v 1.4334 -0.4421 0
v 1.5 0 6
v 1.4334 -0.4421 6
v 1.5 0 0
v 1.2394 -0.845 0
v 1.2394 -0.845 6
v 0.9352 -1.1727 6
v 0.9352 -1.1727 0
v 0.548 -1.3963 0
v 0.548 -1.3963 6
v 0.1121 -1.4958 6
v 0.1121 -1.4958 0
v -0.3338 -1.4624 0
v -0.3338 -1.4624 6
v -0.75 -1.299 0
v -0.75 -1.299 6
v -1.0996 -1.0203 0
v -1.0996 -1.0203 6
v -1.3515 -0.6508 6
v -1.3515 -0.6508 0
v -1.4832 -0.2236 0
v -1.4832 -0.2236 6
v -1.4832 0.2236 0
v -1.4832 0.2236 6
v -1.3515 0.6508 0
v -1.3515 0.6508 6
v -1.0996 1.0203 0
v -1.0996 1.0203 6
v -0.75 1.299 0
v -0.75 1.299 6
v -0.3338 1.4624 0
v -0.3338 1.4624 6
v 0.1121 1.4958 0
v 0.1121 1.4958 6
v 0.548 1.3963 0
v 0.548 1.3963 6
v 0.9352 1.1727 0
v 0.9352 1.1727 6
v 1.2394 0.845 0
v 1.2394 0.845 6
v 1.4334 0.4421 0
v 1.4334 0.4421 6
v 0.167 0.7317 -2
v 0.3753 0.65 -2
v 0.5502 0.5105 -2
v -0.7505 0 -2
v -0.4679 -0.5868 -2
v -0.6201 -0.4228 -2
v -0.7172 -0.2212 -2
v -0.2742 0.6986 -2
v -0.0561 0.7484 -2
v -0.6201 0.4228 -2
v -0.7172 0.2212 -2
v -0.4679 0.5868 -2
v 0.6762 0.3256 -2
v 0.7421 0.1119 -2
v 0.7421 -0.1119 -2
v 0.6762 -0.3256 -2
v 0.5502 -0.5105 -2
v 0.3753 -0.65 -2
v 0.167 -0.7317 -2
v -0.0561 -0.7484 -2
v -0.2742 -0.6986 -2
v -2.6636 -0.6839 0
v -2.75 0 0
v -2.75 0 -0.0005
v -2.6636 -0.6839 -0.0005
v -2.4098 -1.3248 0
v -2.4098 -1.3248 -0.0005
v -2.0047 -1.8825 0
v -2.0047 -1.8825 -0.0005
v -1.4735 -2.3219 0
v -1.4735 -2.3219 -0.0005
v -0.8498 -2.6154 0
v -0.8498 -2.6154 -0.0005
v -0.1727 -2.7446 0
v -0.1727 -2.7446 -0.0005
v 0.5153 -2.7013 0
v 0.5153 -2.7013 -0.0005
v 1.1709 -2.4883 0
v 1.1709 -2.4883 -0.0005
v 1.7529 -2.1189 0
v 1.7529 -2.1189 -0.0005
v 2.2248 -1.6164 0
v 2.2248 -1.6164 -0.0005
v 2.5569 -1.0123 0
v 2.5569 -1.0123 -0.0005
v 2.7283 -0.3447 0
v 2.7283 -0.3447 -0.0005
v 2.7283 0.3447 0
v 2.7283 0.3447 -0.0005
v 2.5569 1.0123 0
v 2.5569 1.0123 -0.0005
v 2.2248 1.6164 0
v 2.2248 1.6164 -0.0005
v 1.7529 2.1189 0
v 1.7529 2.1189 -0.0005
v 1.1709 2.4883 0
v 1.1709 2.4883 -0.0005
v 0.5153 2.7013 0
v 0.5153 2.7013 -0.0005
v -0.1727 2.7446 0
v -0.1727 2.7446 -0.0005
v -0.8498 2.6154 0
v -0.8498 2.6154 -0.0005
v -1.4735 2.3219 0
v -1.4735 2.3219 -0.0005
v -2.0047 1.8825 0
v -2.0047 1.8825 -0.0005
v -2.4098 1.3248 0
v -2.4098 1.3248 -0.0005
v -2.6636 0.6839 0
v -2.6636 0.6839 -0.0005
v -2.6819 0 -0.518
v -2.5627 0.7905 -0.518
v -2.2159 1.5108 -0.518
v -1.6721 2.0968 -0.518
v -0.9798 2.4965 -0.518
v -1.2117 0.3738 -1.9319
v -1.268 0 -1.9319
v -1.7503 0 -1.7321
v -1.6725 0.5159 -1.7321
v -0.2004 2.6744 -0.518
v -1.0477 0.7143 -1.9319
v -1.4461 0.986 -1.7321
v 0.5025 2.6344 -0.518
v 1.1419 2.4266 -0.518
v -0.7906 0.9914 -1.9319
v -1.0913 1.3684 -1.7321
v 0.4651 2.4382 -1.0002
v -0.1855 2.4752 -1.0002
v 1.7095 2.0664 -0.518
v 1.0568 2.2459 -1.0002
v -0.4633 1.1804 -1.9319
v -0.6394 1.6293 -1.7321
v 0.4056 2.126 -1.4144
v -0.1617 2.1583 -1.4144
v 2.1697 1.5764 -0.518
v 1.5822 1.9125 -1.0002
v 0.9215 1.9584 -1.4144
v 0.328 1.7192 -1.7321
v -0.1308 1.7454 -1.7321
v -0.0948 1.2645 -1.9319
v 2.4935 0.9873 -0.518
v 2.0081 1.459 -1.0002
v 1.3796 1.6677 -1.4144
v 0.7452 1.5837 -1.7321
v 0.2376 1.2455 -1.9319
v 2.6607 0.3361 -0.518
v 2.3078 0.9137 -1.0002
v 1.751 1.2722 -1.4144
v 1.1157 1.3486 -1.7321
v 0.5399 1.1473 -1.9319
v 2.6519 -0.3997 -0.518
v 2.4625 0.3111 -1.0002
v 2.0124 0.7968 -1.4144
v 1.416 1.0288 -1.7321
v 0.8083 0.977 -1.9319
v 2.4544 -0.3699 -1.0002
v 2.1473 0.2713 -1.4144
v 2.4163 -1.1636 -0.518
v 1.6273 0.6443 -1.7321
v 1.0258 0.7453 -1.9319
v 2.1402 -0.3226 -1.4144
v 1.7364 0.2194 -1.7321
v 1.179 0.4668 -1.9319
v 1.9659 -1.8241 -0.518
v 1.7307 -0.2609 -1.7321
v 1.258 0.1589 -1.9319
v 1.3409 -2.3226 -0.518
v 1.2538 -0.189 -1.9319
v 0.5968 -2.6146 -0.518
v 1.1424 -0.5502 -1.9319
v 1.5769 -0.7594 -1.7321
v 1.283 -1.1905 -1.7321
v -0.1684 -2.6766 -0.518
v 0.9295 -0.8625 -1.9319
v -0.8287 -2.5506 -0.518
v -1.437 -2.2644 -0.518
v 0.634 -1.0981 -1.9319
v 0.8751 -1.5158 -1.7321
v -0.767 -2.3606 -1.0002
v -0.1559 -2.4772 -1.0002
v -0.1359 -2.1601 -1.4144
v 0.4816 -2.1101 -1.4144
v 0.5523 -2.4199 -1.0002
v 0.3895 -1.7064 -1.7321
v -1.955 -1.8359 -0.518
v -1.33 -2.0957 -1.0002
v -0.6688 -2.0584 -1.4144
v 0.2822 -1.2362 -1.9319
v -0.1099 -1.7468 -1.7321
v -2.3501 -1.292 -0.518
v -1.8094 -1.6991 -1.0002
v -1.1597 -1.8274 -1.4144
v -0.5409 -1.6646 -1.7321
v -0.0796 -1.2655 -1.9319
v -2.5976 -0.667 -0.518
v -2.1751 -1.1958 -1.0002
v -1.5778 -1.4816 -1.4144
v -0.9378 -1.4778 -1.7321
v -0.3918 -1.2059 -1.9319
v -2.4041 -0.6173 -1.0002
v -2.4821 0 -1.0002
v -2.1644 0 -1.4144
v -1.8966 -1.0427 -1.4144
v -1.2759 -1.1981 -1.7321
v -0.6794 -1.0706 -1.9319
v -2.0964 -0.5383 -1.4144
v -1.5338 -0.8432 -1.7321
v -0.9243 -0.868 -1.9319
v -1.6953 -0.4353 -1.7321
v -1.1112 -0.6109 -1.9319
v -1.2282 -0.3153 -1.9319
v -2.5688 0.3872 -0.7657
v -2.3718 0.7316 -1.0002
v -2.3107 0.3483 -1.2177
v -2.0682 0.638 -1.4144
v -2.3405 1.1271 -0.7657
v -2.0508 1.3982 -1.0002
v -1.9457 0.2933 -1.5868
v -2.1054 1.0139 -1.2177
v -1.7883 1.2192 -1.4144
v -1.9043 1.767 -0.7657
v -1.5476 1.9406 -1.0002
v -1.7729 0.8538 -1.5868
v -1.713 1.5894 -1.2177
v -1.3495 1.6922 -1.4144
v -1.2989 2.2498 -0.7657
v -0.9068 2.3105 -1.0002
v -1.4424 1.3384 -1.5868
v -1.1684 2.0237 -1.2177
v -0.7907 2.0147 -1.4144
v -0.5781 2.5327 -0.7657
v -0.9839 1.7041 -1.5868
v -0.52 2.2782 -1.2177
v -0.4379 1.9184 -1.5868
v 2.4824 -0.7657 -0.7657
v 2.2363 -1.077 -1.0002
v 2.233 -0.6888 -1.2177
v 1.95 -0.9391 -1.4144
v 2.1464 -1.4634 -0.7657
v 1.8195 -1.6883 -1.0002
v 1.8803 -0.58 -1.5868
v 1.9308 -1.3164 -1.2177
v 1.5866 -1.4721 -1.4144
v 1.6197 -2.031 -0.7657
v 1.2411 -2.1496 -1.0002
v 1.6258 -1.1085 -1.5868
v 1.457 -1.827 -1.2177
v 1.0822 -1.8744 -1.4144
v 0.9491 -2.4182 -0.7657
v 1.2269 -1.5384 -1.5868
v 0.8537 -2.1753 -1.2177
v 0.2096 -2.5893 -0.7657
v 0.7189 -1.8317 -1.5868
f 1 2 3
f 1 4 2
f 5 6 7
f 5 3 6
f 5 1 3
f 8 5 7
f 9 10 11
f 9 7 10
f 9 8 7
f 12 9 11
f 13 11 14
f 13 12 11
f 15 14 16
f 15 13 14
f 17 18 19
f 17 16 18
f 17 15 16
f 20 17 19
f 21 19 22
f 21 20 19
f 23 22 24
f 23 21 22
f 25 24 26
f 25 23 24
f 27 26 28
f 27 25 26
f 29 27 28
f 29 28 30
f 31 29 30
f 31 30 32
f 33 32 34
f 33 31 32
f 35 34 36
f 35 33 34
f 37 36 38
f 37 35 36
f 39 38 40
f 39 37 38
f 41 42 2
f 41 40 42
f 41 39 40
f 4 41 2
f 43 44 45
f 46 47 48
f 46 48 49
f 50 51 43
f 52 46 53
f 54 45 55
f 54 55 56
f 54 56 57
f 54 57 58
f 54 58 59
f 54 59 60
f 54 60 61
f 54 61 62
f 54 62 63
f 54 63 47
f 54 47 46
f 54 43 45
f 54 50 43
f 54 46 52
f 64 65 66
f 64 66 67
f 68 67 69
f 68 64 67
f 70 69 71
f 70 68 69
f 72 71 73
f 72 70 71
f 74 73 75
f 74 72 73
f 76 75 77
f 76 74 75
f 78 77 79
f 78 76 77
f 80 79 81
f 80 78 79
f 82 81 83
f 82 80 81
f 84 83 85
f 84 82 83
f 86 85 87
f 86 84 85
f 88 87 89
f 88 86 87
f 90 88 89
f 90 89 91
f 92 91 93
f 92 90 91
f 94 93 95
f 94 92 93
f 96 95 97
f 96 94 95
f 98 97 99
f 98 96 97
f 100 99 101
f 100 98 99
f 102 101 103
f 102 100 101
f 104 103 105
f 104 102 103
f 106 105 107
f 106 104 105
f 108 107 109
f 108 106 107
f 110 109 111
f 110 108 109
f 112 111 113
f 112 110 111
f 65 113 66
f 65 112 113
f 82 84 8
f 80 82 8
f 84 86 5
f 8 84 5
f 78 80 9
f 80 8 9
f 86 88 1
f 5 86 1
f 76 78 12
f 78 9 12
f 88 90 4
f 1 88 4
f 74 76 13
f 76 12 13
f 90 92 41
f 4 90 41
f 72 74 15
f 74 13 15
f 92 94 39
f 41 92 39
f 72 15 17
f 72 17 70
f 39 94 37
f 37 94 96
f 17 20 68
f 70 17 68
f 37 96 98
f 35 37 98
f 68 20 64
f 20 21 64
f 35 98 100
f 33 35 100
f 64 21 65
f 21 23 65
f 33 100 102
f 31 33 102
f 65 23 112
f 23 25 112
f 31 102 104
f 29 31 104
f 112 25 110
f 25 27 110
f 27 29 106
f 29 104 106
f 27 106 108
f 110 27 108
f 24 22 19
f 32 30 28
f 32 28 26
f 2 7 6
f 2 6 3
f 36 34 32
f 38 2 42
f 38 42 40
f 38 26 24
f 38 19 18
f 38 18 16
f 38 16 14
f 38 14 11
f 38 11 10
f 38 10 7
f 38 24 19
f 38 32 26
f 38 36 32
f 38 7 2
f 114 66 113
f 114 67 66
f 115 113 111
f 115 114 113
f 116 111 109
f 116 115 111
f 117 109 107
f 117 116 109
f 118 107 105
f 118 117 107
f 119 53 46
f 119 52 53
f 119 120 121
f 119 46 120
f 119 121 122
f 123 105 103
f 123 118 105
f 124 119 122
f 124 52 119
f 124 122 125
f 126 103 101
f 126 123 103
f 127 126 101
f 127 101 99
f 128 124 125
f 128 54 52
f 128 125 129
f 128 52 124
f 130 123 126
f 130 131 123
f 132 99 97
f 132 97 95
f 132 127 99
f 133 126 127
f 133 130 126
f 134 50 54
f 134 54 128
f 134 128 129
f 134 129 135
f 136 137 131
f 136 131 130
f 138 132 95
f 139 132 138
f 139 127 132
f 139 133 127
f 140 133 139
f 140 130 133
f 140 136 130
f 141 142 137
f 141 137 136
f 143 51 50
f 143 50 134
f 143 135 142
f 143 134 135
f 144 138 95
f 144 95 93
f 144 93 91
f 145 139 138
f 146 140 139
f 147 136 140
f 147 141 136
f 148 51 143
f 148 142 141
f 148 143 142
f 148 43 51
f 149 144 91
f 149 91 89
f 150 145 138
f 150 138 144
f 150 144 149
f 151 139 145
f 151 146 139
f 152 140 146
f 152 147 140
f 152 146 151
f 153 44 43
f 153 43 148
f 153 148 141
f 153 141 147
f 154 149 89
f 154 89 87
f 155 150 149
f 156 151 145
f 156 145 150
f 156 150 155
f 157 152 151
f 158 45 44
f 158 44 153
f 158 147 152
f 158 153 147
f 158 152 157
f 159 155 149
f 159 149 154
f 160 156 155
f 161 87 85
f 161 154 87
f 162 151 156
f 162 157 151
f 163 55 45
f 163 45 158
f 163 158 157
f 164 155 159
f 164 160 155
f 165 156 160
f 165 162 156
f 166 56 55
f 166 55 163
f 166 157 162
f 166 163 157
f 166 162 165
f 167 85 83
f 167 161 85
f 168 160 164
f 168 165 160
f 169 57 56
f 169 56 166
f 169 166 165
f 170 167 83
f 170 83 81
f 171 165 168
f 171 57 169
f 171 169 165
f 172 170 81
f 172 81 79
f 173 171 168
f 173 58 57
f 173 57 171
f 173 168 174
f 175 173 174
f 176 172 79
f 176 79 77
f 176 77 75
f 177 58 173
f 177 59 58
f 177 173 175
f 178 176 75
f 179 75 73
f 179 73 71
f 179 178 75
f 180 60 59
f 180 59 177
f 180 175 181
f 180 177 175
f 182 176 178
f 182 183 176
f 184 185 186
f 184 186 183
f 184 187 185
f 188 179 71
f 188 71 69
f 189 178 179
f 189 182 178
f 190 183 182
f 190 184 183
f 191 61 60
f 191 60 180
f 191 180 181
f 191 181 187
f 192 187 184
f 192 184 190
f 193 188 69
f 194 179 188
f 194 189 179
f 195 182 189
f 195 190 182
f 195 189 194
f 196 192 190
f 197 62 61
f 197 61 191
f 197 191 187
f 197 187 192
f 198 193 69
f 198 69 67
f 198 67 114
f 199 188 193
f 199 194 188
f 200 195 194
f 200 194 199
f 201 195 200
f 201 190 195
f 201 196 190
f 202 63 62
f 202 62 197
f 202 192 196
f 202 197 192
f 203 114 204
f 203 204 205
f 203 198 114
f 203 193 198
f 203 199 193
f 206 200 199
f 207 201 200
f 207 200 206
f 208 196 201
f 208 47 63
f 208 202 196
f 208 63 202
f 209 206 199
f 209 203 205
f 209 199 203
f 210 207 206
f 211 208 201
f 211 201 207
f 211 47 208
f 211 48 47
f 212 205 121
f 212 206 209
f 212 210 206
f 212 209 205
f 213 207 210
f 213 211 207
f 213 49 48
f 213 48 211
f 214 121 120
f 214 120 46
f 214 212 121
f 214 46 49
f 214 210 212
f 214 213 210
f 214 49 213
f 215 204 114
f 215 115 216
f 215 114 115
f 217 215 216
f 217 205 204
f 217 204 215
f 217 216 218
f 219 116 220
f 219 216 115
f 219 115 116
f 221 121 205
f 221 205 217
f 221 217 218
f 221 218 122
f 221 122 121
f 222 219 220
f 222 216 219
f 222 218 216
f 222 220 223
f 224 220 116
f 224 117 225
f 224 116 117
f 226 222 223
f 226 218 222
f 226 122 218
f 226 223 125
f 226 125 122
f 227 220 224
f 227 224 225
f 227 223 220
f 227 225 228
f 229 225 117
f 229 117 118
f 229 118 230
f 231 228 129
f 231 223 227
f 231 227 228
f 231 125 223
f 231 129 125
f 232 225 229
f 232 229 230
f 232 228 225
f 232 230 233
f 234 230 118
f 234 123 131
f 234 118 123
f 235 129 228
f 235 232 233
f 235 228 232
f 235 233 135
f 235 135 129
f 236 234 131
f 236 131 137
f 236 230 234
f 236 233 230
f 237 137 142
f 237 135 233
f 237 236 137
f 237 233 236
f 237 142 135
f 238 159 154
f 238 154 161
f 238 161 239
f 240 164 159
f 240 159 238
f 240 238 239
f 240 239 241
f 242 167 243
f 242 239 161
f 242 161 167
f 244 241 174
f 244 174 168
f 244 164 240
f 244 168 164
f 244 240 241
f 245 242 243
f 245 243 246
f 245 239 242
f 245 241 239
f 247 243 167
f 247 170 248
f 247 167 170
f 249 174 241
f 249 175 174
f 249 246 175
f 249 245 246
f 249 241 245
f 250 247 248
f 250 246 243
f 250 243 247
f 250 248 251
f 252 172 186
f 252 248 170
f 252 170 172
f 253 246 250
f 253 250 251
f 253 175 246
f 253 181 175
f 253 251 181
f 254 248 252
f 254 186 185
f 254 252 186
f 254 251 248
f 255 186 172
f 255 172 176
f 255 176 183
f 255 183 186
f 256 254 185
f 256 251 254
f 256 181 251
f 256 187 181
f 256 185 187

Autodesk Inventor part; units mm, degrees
ref_plane "YZ Plane" through (0, 0, 0) normal (1, 0, 0) x (0, 1, 0)
ref_plane "XZ Plane" through (0, 0, 0) normal (0, 1, 0) x (-1, 0, 0)
ref_plane "XY Plane" through (0, 0, 0) normal (0, 0, 1) x (1, 0, 0)
sketch "スケッチ1" plane through (0, 0, 0) normal (0, 0, 1) x (1, 0, 0)
  circle A0 centre (0, 0) radius 1.5
  dimension "d0" = 3
extrude "押し出し1" add sketch "スケッチ1" along normal blind 6
sketch "スケッチ2" plane through (0, 0, 0) normal (0, 0, -1) x (-1, 0, 0)
  circle A0 centre (0, 0) radius 2.75
  dimension "d3" = 5.5
extrude "押し出し2" add sketch "スケッチ2" along normal blind 2
fillet "フィレット1" radius 2 1 edges at (2.75, 0, -2)
thread "ねじ1" size "M3x0.5" class "6g" standard "ANSI Metric M Profile" full length
properties part number "ネジ鍋m3,06" material "鋼、高強度、低合金"
